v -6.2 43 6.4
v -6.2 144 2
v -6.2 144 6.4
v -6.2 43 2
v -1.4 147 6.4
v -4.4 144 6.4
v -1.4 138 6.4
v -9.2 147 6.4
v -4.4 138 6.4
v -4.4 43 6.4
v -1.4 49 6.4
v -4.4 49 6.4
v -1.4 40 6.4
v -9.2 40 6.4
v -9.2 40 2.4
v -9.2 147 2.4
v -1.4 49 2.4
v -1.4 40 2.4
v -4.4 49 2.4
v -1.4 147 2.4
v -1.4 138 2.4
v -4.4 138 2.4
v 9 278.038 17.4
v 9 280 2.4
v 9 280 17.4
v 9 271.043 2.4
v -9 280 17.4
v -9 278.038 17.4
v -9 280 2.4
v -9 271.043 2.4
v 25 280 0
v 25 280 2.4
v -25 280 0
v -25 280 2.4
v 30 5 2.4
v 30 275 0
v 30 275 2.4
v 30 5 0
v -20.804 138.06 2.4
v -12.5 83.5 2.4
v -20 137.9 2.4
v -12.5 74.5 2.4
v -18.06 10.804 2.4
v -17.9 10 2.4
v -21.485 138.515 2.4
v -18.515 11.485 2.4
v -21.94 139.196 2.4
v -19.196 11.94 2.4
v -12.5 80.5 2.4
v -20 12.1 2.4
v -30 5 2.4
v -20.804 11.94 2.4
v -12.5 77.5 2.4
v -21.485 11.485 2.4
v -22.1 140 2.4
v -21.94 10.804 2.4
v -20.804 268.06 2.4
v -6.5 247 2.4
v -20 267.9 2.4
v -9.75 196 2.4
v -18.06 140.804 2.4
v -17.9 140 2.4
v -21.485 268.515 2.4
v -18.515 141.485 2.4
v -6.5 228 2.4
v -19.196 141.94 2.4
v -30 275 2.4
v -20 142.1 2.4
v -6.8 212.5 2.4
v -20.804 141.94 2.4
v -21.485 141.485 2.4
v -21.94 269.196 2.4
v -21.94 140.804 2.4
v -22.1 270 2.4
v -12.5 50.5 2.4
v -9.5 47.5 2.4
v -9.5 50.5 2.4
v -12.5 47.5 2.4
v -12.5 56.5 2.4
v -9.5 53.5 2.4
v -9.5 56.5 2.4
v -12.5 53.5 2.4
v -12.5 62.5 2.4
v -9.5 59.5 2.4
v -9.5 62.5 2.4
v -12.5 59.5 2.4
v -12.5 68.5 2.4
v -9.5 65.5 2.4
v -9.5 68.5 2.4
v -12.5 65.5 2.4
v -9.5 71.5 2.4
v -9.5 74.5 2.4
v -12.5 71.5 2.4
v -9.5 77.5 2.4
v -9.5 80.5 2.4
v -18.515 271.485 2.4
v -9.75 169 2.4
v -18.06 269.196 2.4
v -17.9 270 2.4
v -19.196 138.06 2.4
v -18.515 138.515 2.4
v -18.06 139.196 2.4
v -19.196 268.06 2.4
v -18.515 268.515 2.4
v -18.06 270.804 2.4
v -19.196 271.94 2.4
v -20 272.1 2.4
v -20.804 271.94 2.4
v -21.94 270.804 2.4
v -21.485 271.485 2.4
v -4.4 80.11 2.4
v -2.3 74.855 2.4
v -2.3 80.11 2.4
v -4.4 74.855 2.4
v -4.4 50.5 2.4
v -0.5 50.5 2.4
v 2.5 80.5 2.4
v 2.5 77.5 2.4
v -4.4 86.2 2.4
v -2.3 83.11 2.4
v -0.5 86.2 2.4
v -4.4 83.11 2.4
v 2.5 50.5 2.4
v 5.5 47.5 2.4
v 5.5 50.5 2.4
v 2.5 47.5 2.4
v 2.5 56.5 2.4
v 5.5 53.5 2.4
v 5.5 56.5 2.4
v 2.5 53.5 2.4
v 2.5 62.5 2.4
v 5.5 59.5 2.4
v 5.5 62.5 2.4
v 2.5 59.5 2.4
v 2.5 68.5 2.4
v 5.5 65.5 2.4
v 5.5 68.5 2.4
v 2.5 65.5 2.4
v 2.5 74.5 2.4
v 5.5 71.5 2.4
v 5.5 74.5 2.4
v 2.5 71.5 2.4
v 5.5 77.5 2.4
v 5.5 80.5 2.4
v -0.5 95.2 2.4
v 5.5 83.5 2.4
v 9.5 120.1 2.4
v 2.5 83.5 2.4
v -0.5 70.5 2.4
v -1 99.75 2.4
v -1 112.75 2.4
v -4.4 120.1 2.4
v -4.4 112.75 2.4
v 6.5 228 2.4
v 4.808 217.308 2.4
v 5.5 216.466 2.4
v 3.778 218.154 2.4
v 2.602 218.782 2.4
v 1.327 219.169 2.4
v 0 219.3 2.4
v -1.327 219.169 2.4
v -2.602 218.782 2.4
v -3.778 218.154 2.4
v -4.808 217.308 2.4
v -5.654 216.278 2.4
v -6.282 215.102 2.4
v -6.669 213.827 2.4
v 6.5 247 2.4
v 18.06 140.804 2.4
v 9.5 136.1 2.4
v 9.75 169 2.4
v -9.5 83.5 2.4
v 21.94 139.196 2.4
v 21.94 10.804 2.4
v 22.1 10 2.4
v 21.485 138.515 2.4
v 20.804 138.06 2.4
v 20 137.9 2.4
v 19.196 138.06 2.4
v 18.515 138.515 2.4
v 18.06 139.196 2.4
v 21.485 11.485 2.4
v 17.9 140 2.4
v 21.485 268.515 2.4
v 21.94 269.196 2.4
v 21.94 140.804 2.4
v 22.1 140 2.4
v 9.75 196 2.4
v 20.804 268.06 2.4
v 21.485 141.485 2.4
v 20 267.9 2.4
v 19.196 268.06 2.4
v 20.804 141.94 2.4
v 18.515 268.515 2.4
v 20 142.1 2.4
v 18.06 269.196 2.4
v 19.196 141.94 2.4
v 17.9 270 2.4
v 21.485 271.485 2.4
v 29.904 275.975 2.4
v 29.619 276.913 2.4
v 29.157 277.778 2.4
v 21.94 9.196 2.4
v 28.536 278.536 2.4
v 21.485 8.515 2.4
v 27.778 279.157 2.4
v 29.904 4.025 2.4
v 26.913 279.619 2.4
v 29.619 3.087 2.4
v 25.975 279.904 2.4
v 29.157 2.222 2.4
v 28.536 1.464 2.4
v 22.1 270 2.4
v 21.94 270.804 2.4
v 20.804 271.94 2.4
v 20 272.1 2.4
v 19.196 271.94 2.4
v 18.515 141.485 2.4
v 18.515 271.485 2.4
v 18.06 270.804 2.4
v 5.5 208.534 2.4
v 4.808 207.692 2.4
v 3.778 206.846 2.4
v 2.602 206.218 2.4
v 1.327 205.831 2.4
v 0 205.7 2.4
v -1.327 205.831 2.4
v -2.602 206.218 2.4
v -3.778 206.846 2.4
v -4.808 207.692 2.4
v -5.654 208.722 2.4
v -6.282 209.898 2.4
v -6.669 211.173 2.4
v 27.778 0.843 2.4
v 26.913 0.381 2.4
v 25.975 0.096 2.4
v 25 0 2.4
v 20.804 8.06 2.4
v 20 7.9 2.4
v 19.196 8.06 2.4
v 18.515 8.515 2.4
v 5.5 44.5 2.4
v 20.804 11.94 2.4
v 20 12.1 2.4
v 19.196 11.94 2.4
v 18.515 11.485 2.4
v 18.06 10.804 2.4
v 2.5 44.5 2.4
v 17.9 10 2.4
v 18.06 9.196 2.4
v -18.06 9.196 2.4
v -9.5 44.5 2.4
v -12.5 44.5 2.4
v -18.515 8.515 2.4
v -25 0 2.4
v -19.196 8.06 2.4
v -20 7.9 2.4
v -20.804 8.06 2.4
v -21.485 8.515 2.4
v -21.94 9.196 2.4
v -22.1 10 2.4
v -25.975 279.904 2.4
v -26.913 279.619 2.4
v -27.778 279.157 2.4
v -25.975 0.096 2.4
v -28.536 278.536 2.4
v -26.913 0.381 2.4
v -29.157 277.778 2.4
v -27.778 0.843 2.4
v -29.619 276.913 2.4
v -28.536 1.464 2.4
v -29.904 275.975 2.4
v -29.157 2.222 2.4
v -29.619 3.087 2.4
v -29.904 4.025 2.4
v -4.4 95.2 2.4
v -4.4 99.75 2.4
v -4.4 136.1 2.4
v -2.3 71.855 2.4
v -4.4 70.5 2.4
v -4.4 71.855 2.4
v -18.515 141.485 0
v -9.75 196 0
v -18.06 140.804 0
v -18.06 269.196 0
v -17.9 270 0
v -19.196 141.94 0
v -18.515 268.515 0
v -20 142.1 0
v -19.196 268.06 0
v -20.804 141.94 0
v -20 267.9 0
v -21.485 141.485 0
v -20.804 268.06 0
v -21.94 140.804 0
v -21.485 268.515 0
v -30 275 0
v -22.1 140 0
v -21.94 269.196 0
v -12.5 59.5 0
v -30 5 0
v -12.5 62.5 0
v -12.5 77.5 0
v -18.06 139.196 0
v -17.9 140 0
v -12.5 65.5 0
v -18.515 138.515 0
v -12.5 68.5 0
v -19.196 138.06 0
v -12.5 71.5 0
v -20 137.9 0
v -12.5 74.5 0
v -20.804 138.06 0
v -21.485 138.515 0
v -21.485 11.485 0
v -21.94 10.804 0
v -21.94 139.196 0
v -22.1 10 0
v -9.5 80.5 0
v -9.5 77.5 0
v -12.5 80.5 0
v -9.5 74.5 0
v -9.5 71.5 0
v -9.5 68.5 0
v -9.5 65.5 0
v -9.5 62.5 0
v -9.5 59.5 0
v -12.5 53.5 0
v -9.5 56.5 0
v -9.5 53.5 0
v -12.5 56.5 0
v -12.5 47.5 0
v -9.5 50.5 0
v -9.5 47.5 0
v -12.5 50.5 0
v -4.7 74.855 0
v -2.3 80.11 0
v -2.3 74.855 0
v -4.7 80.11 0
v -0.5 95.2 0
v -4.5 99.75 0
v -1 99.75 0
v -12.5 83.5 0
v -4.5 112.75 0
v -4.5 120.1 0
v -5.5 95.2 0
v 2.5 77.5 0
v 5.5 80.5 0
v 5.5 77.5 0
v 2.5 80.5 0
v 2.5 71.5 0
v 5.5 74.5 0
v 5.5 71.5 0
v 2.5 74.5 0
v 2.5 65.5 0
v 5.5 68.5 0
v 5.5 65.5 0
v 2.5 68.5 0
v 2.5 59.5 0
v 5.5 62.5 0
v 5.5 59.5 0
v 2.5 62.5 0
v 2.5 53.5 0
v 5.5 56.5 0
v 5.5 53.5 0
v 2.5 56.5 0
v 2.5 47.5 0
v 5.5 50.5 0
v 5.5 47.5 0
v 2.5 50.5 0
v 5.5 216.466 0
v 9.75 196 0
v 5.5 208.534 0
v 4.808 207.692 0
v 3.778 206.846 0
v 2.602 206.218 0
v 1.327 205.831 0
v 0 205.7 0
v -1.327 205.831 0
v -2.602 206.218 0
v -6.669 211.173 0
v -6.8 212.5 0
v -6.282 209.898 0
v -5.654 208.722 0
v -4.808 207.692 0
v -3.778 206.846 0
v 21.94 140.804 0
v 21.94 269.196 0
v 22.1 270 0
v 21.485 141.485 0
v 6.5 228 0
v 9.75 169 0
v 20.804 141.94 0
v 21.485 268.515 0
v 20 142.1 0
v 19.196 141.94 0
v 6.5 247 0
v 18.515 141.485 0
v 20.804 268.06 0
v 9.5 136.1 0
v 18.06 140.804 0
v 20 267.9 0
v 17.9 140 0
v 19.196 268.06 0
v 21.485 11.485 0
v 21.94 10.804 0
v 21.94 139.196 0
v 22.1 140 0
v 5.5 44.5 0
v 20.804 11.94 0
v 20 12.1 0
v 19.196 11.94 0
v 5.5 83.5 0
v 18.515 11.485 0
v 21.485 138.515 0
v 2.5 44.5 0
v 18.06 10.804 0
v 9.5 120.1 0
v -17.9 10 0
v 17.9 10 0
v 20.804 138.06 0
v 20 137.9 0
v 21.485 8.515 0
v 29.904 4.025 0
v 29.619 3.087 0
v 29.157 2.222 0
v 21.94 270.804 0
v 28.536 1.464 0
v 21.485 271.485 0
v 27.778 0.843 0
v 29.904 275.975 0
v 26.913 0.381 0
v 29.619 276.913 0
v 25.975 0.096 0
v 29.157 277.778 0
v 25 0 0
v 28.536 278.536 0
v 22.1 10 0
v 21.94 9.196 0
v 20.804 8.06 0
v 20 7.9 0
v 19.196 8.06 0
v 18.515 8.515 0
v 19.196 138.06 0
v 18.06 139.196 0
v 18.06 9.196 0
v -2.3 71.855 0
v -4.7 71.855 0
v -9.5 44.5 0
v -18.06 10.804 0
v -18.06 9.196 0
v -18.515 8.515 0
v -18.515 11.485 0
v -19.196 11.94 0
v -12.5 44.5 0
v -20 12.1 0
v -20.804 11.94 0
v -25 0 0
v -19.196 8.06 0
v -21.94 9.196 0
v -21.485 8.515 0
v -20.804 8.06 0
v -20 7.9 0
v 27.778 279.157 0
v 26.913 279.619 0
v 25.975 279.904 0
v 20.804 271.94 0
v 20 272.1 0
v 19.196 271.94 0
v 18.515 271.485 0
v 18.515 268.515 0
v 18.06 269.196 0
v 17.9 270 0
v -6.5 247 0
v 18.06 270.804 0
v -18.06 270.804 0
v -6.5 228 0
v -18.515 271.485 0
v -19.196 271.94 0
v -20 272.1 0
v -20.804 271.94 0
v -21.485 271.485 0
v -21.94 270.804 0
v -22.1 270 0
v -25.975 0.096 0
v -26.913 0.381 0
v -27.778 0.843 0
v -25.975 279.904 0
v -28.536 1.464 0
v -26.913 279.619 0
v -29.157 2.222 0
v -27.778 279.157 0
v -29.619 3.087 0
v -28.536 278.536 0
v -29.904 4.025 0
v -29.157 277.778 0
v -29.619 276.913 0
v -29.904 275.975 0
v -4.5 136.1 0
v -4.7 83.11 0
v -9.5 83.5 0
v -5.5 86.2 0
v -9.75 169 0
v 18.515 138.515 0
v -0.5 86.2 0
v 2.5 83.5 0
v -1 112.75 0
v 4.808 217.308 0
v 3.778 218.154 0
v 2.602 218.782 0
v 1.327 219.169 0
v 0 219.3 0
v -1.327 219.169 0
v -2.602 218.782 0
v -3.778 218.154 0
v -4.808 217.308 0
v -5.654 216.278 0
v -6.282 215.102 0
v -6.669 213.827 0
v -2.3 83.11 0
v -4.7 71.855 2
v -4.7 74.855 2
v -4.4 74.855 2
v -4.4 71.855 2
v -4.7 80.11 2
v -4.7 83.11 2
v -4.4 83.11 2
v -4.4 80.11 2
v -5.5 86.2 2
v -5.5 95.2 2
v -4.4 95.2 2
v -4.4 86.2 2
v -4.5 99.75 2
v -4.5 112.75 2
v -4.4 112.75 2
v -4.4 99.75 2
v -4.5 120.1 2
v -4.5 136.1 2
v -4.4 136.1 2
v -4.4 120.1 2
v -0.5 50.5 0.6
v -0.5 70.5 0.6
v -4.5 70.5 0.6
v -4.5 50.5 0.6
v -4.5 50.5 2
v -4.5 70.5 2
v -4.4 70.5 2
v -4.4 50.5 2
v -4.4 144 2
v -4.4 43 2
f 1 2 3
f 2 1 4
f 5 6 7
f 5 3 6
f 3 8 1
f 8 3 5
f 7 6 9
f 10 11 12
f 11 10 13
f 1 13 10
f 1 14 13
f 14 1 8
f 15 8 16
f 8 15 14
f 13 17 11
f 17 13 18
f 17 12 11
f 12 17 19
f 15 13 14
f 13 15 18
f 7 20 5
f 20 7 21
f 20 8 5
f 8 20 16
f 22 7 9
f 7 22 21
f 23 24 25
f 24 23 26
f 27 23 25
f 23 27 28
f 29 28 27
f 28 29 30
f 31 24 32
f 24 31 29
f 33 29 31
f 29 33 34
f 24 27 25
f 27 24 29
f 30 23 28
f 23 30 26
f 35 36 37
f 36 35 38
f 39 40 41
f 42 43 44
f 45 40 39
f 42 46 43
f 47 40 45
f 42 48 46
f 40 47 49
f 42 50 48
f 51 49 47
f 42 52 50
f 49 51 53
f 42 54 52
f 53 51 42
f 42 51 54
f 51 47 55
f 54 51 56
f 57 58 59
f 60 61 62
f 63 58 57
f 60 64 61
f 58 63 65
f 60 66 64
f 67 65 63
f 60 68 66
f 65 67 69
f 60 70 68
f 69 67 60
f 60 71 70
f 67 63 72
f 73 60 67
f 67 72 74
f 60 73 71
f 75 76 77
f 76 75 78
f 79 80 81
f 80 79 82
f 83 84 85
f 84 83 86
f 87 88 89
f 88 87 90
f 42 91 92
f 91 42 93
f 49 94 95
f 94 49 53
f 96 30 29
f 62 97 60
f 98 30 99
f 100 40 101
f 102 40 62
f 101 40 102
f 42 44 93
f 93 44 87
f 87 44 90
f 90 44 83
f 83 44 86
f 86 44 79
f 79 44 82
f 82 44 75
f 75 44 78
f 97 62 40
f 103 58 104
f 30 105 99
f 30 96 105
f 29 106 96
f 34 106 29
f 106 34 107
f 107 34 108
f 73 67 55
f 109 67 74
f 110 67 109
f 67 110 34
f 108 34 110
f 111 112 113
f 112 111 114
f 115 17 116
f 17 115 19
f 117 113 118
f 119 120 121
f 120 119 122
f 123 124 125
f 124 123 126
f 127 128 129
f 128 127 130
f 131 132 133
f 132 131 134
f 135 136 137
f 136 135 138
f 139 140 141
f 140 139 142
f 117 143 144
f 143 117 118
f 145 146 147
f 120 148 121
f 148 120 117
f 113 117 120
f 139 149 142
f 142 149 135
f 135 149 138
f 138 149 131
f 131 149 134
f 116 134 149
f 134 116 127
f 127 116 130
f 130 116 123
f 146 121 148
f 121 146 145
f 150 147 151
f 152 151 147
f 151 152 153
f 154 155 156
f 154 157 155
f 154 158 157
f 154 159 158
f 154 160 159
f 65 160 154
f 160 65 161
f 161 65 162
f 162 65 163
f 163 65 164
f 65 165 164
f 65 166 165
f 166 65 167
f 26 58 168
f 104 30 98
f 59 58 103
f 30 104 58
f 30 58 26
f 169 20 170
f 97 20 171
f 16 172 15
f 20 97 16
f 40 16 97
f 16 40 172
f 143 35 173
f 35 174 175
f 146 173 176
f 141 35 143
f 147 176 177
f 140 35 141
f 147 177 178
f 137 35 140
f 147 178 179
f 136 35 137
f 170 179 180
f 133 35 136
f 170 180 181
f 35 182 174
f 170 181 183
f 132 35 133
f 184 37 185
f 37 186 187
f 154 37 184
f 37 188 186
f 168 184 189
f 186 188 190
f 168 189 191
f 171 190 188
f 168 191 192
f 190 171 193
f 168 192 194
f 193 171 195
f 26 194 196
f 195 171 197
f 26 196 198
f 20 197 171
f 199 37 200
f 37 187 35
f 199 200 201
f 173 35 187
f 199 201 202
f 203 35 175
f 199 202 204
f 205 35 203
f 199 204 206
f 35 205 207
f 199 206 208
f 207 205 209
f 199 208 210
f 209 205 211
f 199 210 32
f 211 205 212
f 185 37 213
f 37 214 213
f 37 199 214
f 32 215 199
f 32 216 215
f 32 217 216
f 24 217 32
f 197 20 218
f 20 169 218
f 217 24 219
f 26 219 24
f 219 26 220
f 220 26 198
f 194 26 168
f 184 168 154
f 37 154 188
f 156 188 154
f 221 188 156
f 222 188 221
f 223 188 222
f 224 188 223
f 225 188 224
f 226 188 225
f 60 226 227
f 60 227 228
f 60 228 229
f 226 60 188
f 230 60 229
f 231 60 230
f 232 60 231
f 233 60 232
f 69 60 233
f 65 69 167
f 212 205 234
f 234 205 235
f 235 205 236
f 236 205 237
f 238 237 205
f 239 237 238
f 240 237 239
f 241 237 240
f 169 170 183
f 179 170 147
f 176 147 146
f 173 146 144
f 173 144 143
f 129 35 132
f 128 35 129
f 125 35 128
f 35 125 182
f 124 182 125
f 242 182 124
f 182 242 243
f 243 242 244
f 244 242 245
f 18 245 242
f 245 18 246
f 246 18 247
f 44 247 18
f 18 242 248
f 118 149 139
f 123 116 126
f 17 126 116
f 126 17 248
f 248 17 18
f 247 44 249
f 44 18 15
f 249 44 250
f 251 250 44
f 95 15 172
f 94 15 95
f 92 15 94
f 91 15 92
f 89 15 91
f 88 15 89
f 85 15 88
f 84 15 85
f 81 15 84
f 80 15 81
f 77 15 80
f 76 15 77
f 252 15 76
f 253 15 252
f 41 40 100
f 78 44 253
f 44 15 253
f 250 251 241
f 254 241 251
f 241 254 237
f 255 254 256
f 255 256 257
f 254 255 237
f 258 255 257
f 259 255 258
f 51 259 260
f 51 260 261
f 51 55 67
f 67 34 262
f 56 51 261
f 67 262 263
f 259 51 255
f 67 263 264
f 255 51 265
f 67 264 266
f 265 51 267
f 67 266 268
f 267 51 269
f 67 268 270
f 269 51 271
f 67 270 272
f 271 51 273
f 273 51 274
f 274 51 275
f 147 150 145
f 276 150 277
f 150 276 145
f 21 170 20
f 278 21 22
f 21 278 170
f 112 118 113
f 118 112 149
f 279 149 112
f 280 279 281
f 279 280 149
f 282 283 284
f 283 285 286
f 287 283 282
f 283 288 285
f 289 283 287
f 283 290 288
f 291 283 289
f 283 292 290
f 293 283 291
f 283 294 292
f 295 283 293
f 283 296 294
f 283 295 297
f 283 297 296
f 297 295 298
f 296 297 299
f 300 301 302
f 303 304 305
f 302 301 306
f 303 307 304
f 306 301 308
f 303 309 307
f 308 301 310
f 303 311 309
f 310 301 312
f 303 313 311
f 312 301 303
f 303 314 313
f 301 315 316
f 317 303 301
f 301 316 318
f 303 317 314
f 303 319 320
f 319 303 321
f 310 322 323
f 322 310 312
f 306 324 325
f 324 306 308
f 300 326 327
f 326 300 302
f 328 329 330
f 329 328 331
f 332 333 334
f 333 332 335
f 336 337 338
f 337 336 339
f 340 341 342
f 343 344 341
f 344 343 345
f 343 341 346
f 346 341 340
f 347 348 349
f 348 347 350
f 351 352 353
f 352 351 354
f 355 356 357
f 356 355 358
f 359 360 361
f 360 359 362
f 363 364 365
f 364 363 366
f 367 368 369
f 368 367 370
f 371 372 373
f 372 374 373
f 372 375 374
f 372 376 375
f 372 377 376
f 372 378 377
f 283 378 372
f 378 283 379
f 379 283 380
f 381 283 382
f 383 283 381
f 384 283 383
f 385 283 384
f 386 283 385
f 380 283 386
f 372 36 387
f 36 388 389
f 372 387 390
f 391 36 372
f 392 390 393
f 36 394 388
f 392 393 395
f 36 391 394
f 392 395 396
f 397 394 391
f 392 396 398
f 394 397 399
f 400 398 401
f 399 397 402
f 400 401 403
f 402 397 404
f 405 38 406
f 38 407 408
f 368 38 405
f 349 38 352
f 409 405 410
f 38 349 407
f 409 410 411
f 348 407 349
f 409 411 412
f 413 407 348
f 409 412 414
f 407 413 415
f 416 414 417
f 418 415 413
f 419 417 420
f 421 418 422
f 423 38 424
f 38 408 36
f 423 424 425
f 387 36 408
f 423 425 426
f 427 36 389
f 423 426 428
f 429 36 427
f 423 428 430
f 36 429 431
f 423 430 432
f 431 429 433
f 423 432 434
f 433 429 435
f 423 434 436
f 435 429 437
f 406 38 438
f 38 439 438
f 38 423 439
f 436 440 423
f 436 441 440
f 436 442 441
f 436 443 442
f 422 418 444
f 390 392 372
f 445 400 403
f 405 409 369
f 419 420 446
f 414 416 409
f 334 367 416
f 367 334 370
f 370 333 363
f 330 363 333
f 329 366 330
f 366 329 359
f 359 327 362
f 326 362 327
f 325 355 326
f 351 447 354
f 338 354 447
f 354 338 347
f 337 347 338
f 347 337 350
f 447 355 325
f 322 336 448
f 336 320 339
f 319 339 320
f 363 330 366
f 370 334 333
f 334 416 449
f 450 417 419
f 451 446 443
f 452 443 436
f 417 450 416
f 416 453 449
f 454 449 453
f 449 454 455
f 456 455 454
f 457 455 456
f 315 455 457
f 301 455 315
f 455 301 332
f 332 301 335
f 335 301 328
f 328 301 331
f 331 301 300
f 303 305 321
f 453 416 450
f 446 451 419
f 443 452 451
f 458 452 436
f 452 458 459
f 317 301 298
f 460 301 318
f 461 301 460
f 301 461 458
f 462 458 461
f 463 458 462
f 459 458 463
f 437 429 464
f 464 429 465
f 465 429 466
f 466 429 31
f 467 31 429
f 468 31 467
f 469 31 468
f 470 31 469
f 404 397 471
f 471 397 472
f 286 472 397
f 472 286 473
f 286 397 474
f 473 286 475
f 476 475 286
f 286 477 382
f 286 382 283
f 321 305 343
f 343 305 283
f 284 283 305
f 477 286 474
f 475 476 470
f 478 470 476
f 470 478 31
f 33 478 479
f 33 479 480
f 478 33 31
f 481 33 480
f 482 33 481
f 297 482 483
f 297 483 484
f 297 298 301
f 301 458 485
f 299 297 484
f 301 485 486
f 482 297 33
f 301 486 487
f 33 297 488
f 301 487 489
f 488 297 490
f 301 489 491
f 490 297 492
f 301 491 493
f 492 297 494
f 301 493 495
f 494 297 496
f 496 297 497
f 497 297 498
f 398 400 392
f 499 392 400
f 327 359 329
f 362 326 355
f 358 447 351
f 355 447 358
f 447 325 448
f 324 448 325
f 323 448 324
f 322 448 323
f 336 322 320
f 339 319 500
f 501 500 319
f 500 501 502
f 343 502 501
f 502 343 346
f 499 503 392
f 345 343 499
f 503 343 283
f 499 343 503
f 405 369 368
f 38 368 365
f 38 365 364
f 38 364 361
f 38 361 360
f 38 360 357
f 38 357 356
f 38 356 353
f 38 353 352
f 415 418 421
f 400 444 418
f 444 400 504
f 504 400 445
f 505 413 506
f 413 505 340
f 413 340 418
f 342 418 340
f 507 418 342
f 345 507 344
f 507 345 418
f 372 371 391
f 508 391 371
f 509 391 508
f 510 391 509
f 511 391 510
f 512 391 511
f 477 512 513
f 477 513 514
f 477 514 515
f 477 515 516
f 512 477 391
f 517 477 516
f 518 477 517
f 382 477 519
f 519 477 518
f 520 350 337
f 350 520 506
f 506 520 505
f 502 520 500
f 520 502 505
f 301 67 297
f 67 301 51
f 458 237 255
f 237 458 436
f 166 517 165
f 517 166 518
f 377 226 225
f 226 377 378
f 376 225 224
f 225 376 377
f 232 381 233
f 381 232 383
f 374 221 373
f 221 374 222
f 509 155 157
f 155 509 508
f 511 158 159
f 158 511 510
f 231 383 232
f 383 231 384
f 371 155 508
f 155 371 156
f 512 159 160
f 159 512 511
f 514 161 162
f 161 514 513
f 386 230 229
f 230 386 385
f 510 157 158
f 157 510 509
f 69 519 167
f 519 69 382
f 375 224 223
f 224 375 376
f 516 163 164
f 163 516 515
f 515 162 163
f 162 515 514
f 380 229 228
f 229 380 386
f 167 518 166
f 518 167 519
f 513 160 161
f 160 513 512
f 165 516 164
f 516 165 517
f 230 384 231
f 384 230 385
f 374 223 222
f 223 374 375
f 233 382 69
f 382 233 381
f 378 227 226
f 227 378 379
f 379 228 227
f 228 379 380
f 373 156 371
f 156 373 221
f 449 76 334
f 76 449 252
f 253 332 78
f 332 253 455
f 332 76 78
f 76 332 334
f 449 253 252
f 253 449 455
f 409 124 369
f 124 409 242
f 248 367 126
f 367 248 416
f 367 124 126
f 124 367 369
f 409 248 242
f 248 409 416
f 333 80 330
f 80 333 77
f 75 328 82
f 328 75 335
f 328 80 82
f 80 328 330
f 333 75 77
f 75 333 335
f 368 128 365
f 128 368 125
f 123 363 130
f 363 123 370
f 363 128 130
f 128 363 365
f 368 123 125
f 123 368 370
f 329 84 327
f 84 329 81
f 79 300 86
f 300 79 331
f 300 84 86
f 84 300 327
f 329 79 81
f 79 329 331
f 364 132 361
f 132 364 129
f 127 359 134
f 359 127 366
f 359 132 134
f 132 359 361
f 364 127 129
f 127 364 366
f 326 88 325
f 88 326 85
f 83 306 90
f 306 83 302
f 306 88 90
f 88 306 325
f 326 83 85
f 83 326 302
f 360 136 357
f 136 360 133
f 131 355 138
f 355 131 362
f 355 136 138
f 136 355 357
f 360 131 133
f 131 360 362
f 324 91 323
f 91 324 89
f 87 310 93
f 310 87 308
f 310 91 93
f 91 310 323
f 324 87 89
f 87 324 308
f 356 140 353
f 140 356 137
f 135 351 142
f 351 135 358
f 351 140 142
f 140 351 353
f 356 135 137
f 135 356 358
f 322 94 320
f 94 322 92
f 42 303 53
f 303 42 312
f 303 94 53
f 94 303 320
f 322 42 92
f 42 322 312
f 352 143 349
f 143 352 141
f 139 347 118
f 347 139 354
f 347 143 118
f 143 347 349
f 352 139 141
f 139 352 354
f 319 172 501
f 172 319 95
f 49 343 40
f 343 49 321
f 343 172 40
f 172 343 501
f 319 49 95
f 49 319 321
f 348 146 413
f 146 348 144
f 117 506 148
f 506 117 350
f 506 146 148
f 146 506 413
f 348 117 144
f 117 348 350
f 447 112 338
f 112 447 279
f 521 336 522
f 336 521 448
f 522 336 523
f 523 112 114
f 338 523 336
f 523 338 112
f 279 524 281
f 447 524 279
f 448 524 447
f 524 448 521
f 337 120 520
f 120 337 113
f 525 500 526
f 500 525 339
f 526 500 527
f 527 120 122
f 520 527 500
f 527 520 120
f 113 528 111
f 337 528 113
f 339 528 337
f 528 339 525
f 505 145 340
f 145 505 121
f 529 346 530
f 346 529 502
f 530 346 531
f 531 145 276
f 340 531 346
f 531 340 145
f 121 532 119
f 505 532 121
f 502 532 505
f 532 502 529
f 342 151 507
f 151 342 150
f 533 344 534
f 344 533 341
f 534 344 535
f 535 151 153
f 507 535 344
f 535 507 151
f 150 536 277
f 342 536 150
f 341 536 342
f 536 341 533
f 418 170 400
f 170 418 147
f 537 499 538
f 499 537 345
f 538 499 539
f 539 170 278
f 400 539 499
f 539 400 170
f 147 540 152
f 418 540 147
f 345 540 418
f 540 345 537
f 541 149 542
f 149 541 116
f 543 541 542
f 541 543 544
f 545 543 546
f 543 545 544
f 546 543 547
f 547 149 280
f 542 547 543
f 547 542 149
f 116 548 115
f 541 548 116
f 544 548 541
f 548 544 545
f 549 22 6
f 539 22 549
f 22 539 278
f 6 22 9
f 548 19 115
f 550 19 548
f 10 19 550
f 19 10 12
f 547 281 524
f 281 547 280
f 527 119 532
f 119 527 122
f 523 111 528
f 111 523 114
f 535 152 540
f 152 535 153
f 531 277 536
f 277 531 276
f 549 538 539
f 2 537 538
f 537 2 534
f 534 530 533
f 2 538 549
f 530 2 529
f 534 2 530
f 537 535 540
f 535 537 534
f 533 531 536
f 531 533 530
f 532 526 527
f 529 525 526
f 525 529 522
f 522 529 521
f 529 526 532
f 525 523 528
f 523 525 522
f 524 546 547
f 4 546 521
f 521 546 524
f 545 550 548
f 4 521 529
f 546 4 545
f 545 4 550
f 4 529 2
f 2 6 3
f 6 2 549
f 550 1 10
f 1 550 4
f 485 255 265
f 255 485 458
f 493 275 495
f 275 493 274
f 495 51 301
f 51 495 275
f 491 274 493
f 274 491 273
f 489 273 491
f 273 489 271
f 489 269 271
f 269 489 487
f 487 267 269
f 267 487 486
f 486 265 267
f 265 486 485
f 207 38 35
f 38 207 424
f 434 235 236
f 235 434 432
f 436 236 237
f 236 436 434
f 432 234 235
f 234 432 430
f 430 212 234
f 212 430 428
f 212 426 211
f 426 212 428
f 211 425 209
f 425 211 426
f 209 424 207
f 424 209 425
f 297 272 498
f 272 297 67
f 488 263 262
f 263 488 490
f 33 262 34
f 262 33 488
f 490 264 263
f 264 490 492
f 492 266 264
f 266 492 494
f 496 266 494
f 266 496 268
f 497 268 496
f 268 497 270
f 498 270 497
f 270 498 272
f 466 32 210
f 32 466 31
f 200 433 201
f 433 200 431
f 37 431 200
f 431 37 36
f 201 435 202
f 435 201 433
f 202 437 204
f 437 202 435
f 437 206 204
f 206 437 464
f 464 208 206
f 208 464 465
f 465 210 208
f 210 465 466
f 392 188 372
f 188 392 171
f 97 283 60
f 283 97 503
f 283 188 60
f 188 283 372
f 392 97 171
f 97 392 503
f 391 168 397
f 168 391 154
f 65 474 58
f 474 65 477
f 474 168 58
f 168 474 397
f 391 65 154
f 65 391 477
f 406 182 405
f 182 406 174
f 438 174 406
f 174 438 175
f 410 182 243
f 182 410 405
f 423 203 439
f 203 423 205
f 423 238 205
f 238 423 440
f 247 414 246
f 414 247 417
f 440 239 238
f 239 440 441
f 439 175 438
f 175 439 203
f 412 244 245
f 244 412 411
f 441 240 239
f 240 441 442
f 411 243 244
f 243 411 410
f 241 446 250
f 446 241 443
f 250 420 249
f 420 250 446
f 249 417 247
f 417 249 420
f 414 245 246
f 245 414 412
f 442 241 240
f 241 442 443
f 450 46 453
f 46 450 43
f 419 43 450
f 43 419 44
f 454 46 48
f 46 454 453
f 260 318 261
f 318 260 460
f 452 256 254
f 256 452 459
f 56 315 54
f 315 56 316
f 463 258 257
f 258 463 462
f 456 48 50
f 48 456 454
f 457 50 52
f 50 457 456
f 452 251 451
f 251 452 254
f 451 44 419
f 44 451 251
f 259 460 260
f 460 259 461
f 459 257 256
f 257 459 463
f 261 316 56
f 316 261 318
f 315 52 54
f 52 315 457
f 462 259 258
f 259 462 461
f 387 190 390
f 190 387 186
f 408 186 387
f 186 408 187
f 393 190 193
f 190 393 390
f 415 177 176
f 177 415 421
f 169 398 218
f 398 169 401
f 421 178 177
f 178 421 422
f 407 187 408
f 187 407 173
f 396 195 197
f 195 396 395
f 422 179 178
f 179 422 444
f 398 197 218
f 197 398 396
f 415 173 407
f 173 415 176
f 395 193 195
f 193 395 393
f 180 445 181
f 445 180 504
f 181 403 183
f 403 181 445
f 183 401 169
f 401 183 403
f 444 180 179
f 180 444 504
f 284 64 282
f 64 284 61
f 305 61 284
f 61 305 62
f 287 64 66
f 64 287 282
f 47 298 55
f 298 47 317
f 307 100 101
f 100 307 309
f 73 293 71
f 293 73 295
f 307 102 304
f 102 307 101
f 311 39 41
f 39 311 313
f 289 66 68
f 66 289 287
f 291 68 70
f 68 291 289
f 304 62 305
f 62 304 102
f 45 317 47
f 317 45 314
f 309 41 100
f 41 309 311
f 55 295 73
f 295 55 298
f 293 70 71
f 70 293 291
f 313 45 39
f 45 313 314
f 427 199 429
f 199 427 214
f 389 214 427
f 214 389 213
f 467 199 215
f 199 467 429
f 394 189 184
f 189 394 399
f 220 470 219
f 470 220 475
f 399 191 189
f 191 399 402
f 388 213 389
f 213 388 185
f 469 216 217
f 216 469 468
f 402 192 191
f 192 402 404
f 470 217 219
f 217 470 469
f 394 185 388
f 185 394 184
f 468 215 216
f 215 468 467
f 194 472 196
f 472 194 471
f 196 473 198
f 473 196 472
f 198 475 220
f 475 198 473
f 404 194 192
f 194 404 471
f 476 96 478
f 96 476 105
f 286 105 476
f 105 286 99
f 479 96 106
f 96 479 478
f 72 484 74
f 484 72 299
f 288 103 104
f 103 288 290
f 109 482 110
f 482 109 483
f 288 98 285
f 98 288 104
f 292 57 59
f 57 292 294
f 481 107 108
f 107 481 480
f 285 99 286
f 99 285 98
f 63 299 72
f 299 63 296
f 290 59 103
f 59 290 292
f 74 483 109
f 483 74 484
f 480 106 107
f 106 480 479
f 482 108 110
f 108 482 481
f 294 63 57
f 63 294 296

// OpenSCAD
/* [Hidden] */
// Kossel mains inlet panel and Duet mount

/* [Options] */

// Which type of Duet will you be using?
Wifi=0;		// [0: Ethernet Duet 0.8.5 or Duet 0.6,1:Duet WiFi]

/* [Hidden] */

length=280;
height=60;
thickness=2.4;	// change to be a multippe of your printing latewr height

// The reference point for all of the following is the top side of the corner of the PCB that is
// closest to the extruder heater connector(s).
// xxxOffset is the height of the bottom of the cutout above the top surface of the PCB.
// xxxPos is the distance from the centre of the cutout to the corner of the board.

inletOffset=220-(355-280)/2;
duetYOffset=81 - (355-length)/2;
duetTopXOffset=-10+5.5;

pbHeight=2.4;
pbWidth=3;
pbOffset=-0.2;
pbPos1=29.855;
pbPos2=38.11;

usbHeight=5;
usbWidth=9;
usbOffset=-1;
usbPos=47.2;

sdHeight= 3.5;
sdWidth=13;
sdOffset=0;
sdPos=62.75;

ethernetHeight=14;
ethernetWidth=16;
ethernetOffset=0;
ethernetPos=84.6;

wifiHeight=1.8;
wifiWidth=18;
wifiOffset=-0.2;
wifiPos=81.6;

ribThickness=3;
ribHeight=4;
pcbThick=1.6;
pcbClear=0.1;
pcbWidth=100;
pcbWclear=0.5;

round=5;
m4ClearRad=2.1;

overlap=0.02;

module fuseCutout() {
	translate([0,0,-overlap])
		difference() {
			cylinder(r=6.8,h=thickness+2*overlap,$fn=32);
			translate([5.5,-10,-overlap]) cube([20,20,thickness+4*overlap]);
		}
}

module switchCutout() {
	union() {
		cube([13,19,10], center=true);
	}
}

module inletCutout() {
	union() {
		cube([19.5,27,10], center=true);
	}
}

// Finger guard is aligned with right side at Y=0
module fingerGuard() {
	translate([-9,-10,0])
		difference() {
			cube([18,10,15+overlap]);
			translate([-1,-10,0]) rotate([-25,0,0]) cube([20,10,50]);
		}
}

module roundCorner(radius, height) {
	difference() {
		cube([radius+2,radius+2,height]);
		translate([0,0,-overlap]) cylinder(r=radius,h=height+2*overlap,$fn=32);
	}
}

// Duet connector cutout, referenced to the bottom corner and the top of the PCB
module duetCutouts() {
	// push buttons
	translate([pbOffset + pbHeight/2,pbPos1,-overlap]) cube([pbHeight,pbWidth,10], center=true);
	translate([pbOffset + pbHeight/2,pbPos2,-overlap]) cube([pbHeight,pbWidth,10], center=true);
	// USB connector
	translate([usbOffset + usbHeight/2,usbPos,-overlap]) cube([usbHeight,usbWidth,20], center=true);
	// SD card
	translate([sdOffset + sdHeight/2,sdPos,-overlap]) cube([sdHeight,sdWidth,10], center=true);
	// Ethernet or Wifi
	if (Wifi) {
		translate([wifiOffset + wifiHeight/2,wifiPos,-overlap])
			cube([wifiHeight,wifiWidth,10], center=true);
	} else {
		translate([ethernetOffset + ethernetHeight/2,ethernetPos,-overlap])
			cube([ethernetHeight,ethernetWidth,10], center=true);
	}
	// LEDs
	translate([0,7,0.6]) cube([4,20,10]);
	// Board
	translate([-pcbThick-pcbClear,-pcbWclear,2.0])
		cube([pcbThick+2*pcbClear,pcbWidth+2*pcbWclear, 10]);
	// Ventilation holes
	for(y=[1:6:40])
		for(x=[-8,7])
			translate([x,y,-overlap])
				cube([3,3,10]);
}

module duetRibs() {
	translate([-pcbThick-pcbClear-ribThickness,-overlap,thickness-overlap])
		cube([ribThickness,pcbWidth+pcbWclear+2*overlap,ribHeight+overlap]);

	translate([-ribThickness-pcbThick-pcbClear,-ribThickness-pcbWclear,thickness-overlap])
		cube([pcbThick+2*ribThickness+2*pcbClear,6+ribThickness,ribHeight+overlap]);
	translate([-ribThickness-pcbThick-pcbClear,pcbWidth+pcbWclear-6,thickness-overlap])
		cube([pcbThick+2*ribThickness+2*pcbClear,6+ribThickness,ribHeight+overlap]);
}

difference() {
	union() {
		translate([-height/2,0,0]) cube([height,length,thickness]);
		translate([duetTopXOffset,duetYOffset, 0]) duetRibs();
		translate([0,length,thickness-overlap]) fingerGuard();
	}
	translate([0,inletOffset,0]) inletCutout();
	translate([0,inletOffset+30,0]) fuseCutout();
	translate([0,inletOffset+55,0]) switchCutout();

	translate([duetTopXOffset,duetYOffset,0]) duetCutouts();

	// Screw holes
	translate([20,10,-overlap]) cylinder(r=m4ClearRad,h=thickness+2*overlap, $fn=16);
	translate([-20,10,-overlap]) cylinder(r=m4ClearRad,h=thickness+2*overlap, $fn=16);
	translate([20,length/2,-overlap]) cylinder(r=m4ClearRad,h=thickness+2*overlap, $fn=16);
	translate([-20,length/2,-overlap]) cylinder(r=m4ClearRad,h=thickness+2*overlap, $fn=16);
	translate([20,length-10,-overlap]) cylinder(r=m4ClearRad,h=thickness+2*overlap, $fn=16);
	translate([-20,length-10,-overlap]) cylinder(r=m4ClearRad,h=thickness+2*overlap, $fn=16);

	// Corners
	translate([-height/2+round,round,-overlap])
		rotate([0,0,180]) roundCorner(round,thickness+2*overlap);
	translate([height/2-round,round,-overlap])
		rotate([0,0,-90]) roundCorner(round,thickness+2*overlap);
	translate([-height/2+round,length-round,-overlap])
		rotate([0,0,90]) roundCorner(round,thickness+2*overlap);
	translate([height/2-round,length-round,-overlap])
		rotate([0,0,0]) roundCorner(round,thickness+2*overlap);
}


